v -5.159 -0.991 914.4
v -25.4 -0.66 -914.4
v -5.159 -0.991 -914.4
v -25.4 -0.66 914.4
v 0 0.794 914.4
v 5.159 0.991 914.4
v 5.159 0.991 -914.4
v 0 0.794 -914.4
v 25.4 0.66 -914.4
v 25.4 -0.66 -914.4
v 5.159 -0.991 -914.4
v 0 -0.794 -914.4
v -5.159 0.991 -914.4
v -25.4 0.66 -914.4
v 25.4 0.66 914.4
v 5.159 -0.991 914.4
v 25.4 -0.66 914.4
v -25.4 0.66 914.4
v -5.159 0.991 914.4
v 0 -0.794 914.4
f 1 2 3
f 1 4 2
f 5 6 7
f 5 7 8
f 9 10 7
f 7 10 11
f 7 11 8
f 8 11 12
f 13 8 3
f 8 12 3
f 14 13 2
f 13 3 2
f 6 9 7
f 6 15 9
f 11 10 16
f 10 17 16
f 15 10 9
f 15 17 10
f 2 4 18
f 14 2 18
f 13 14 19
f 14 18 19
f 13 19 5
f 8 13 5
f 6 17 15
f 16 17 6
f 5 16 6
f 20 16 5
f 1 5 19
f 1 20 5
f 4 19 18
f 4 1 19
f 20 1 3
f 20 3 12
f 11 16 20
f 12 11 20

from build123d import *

# Parameters (mm, degrees)
EXTRUDE1_DEPTH       = 914.4
MIRROR2_COPY_1_DEPTH = 914.4


with BuildPart() as part:
    # Sketch1 → Extrude1 (new, symmetric)
    with BuildSketch(Plane.XY):
        Polygon((-25.4, -0.6604), (-5.159375, -0.9906), (0, -0.79375), (0, 0), (-25.4, 0), align=None)
    extrude1 = extrude(amount=EXTRUDE1_DEPTH, both=True)

    # Mirror1: Extrude1 across plane
    add(extrude1.mirror(Plane(origin=(0, 0, 0), x_dir=(0, 0, 1), z_dir=(1, 0, 0))))

    # Mirror2: Extrude1 across plane
    add(extrude1.mirror(Plane.ZX))

    # Mirror2 copy 1 sketch → Mirror2 copy 1 (add, symmetric)
    with BuildSketch(Plane(origin=(0, 0, 0), x_dir=(-1, 0, 0), z_dir=(0, 0, 1))):
        Polygon((-25.4, -0.6604), (-5.159375, -0.9906), (0, -0.79375), (0, 0), (-25.4, 0), align=None)
    extrude(amount=MIRROR2_COPY_1_DEPTH, both=True)


solid = part.part
